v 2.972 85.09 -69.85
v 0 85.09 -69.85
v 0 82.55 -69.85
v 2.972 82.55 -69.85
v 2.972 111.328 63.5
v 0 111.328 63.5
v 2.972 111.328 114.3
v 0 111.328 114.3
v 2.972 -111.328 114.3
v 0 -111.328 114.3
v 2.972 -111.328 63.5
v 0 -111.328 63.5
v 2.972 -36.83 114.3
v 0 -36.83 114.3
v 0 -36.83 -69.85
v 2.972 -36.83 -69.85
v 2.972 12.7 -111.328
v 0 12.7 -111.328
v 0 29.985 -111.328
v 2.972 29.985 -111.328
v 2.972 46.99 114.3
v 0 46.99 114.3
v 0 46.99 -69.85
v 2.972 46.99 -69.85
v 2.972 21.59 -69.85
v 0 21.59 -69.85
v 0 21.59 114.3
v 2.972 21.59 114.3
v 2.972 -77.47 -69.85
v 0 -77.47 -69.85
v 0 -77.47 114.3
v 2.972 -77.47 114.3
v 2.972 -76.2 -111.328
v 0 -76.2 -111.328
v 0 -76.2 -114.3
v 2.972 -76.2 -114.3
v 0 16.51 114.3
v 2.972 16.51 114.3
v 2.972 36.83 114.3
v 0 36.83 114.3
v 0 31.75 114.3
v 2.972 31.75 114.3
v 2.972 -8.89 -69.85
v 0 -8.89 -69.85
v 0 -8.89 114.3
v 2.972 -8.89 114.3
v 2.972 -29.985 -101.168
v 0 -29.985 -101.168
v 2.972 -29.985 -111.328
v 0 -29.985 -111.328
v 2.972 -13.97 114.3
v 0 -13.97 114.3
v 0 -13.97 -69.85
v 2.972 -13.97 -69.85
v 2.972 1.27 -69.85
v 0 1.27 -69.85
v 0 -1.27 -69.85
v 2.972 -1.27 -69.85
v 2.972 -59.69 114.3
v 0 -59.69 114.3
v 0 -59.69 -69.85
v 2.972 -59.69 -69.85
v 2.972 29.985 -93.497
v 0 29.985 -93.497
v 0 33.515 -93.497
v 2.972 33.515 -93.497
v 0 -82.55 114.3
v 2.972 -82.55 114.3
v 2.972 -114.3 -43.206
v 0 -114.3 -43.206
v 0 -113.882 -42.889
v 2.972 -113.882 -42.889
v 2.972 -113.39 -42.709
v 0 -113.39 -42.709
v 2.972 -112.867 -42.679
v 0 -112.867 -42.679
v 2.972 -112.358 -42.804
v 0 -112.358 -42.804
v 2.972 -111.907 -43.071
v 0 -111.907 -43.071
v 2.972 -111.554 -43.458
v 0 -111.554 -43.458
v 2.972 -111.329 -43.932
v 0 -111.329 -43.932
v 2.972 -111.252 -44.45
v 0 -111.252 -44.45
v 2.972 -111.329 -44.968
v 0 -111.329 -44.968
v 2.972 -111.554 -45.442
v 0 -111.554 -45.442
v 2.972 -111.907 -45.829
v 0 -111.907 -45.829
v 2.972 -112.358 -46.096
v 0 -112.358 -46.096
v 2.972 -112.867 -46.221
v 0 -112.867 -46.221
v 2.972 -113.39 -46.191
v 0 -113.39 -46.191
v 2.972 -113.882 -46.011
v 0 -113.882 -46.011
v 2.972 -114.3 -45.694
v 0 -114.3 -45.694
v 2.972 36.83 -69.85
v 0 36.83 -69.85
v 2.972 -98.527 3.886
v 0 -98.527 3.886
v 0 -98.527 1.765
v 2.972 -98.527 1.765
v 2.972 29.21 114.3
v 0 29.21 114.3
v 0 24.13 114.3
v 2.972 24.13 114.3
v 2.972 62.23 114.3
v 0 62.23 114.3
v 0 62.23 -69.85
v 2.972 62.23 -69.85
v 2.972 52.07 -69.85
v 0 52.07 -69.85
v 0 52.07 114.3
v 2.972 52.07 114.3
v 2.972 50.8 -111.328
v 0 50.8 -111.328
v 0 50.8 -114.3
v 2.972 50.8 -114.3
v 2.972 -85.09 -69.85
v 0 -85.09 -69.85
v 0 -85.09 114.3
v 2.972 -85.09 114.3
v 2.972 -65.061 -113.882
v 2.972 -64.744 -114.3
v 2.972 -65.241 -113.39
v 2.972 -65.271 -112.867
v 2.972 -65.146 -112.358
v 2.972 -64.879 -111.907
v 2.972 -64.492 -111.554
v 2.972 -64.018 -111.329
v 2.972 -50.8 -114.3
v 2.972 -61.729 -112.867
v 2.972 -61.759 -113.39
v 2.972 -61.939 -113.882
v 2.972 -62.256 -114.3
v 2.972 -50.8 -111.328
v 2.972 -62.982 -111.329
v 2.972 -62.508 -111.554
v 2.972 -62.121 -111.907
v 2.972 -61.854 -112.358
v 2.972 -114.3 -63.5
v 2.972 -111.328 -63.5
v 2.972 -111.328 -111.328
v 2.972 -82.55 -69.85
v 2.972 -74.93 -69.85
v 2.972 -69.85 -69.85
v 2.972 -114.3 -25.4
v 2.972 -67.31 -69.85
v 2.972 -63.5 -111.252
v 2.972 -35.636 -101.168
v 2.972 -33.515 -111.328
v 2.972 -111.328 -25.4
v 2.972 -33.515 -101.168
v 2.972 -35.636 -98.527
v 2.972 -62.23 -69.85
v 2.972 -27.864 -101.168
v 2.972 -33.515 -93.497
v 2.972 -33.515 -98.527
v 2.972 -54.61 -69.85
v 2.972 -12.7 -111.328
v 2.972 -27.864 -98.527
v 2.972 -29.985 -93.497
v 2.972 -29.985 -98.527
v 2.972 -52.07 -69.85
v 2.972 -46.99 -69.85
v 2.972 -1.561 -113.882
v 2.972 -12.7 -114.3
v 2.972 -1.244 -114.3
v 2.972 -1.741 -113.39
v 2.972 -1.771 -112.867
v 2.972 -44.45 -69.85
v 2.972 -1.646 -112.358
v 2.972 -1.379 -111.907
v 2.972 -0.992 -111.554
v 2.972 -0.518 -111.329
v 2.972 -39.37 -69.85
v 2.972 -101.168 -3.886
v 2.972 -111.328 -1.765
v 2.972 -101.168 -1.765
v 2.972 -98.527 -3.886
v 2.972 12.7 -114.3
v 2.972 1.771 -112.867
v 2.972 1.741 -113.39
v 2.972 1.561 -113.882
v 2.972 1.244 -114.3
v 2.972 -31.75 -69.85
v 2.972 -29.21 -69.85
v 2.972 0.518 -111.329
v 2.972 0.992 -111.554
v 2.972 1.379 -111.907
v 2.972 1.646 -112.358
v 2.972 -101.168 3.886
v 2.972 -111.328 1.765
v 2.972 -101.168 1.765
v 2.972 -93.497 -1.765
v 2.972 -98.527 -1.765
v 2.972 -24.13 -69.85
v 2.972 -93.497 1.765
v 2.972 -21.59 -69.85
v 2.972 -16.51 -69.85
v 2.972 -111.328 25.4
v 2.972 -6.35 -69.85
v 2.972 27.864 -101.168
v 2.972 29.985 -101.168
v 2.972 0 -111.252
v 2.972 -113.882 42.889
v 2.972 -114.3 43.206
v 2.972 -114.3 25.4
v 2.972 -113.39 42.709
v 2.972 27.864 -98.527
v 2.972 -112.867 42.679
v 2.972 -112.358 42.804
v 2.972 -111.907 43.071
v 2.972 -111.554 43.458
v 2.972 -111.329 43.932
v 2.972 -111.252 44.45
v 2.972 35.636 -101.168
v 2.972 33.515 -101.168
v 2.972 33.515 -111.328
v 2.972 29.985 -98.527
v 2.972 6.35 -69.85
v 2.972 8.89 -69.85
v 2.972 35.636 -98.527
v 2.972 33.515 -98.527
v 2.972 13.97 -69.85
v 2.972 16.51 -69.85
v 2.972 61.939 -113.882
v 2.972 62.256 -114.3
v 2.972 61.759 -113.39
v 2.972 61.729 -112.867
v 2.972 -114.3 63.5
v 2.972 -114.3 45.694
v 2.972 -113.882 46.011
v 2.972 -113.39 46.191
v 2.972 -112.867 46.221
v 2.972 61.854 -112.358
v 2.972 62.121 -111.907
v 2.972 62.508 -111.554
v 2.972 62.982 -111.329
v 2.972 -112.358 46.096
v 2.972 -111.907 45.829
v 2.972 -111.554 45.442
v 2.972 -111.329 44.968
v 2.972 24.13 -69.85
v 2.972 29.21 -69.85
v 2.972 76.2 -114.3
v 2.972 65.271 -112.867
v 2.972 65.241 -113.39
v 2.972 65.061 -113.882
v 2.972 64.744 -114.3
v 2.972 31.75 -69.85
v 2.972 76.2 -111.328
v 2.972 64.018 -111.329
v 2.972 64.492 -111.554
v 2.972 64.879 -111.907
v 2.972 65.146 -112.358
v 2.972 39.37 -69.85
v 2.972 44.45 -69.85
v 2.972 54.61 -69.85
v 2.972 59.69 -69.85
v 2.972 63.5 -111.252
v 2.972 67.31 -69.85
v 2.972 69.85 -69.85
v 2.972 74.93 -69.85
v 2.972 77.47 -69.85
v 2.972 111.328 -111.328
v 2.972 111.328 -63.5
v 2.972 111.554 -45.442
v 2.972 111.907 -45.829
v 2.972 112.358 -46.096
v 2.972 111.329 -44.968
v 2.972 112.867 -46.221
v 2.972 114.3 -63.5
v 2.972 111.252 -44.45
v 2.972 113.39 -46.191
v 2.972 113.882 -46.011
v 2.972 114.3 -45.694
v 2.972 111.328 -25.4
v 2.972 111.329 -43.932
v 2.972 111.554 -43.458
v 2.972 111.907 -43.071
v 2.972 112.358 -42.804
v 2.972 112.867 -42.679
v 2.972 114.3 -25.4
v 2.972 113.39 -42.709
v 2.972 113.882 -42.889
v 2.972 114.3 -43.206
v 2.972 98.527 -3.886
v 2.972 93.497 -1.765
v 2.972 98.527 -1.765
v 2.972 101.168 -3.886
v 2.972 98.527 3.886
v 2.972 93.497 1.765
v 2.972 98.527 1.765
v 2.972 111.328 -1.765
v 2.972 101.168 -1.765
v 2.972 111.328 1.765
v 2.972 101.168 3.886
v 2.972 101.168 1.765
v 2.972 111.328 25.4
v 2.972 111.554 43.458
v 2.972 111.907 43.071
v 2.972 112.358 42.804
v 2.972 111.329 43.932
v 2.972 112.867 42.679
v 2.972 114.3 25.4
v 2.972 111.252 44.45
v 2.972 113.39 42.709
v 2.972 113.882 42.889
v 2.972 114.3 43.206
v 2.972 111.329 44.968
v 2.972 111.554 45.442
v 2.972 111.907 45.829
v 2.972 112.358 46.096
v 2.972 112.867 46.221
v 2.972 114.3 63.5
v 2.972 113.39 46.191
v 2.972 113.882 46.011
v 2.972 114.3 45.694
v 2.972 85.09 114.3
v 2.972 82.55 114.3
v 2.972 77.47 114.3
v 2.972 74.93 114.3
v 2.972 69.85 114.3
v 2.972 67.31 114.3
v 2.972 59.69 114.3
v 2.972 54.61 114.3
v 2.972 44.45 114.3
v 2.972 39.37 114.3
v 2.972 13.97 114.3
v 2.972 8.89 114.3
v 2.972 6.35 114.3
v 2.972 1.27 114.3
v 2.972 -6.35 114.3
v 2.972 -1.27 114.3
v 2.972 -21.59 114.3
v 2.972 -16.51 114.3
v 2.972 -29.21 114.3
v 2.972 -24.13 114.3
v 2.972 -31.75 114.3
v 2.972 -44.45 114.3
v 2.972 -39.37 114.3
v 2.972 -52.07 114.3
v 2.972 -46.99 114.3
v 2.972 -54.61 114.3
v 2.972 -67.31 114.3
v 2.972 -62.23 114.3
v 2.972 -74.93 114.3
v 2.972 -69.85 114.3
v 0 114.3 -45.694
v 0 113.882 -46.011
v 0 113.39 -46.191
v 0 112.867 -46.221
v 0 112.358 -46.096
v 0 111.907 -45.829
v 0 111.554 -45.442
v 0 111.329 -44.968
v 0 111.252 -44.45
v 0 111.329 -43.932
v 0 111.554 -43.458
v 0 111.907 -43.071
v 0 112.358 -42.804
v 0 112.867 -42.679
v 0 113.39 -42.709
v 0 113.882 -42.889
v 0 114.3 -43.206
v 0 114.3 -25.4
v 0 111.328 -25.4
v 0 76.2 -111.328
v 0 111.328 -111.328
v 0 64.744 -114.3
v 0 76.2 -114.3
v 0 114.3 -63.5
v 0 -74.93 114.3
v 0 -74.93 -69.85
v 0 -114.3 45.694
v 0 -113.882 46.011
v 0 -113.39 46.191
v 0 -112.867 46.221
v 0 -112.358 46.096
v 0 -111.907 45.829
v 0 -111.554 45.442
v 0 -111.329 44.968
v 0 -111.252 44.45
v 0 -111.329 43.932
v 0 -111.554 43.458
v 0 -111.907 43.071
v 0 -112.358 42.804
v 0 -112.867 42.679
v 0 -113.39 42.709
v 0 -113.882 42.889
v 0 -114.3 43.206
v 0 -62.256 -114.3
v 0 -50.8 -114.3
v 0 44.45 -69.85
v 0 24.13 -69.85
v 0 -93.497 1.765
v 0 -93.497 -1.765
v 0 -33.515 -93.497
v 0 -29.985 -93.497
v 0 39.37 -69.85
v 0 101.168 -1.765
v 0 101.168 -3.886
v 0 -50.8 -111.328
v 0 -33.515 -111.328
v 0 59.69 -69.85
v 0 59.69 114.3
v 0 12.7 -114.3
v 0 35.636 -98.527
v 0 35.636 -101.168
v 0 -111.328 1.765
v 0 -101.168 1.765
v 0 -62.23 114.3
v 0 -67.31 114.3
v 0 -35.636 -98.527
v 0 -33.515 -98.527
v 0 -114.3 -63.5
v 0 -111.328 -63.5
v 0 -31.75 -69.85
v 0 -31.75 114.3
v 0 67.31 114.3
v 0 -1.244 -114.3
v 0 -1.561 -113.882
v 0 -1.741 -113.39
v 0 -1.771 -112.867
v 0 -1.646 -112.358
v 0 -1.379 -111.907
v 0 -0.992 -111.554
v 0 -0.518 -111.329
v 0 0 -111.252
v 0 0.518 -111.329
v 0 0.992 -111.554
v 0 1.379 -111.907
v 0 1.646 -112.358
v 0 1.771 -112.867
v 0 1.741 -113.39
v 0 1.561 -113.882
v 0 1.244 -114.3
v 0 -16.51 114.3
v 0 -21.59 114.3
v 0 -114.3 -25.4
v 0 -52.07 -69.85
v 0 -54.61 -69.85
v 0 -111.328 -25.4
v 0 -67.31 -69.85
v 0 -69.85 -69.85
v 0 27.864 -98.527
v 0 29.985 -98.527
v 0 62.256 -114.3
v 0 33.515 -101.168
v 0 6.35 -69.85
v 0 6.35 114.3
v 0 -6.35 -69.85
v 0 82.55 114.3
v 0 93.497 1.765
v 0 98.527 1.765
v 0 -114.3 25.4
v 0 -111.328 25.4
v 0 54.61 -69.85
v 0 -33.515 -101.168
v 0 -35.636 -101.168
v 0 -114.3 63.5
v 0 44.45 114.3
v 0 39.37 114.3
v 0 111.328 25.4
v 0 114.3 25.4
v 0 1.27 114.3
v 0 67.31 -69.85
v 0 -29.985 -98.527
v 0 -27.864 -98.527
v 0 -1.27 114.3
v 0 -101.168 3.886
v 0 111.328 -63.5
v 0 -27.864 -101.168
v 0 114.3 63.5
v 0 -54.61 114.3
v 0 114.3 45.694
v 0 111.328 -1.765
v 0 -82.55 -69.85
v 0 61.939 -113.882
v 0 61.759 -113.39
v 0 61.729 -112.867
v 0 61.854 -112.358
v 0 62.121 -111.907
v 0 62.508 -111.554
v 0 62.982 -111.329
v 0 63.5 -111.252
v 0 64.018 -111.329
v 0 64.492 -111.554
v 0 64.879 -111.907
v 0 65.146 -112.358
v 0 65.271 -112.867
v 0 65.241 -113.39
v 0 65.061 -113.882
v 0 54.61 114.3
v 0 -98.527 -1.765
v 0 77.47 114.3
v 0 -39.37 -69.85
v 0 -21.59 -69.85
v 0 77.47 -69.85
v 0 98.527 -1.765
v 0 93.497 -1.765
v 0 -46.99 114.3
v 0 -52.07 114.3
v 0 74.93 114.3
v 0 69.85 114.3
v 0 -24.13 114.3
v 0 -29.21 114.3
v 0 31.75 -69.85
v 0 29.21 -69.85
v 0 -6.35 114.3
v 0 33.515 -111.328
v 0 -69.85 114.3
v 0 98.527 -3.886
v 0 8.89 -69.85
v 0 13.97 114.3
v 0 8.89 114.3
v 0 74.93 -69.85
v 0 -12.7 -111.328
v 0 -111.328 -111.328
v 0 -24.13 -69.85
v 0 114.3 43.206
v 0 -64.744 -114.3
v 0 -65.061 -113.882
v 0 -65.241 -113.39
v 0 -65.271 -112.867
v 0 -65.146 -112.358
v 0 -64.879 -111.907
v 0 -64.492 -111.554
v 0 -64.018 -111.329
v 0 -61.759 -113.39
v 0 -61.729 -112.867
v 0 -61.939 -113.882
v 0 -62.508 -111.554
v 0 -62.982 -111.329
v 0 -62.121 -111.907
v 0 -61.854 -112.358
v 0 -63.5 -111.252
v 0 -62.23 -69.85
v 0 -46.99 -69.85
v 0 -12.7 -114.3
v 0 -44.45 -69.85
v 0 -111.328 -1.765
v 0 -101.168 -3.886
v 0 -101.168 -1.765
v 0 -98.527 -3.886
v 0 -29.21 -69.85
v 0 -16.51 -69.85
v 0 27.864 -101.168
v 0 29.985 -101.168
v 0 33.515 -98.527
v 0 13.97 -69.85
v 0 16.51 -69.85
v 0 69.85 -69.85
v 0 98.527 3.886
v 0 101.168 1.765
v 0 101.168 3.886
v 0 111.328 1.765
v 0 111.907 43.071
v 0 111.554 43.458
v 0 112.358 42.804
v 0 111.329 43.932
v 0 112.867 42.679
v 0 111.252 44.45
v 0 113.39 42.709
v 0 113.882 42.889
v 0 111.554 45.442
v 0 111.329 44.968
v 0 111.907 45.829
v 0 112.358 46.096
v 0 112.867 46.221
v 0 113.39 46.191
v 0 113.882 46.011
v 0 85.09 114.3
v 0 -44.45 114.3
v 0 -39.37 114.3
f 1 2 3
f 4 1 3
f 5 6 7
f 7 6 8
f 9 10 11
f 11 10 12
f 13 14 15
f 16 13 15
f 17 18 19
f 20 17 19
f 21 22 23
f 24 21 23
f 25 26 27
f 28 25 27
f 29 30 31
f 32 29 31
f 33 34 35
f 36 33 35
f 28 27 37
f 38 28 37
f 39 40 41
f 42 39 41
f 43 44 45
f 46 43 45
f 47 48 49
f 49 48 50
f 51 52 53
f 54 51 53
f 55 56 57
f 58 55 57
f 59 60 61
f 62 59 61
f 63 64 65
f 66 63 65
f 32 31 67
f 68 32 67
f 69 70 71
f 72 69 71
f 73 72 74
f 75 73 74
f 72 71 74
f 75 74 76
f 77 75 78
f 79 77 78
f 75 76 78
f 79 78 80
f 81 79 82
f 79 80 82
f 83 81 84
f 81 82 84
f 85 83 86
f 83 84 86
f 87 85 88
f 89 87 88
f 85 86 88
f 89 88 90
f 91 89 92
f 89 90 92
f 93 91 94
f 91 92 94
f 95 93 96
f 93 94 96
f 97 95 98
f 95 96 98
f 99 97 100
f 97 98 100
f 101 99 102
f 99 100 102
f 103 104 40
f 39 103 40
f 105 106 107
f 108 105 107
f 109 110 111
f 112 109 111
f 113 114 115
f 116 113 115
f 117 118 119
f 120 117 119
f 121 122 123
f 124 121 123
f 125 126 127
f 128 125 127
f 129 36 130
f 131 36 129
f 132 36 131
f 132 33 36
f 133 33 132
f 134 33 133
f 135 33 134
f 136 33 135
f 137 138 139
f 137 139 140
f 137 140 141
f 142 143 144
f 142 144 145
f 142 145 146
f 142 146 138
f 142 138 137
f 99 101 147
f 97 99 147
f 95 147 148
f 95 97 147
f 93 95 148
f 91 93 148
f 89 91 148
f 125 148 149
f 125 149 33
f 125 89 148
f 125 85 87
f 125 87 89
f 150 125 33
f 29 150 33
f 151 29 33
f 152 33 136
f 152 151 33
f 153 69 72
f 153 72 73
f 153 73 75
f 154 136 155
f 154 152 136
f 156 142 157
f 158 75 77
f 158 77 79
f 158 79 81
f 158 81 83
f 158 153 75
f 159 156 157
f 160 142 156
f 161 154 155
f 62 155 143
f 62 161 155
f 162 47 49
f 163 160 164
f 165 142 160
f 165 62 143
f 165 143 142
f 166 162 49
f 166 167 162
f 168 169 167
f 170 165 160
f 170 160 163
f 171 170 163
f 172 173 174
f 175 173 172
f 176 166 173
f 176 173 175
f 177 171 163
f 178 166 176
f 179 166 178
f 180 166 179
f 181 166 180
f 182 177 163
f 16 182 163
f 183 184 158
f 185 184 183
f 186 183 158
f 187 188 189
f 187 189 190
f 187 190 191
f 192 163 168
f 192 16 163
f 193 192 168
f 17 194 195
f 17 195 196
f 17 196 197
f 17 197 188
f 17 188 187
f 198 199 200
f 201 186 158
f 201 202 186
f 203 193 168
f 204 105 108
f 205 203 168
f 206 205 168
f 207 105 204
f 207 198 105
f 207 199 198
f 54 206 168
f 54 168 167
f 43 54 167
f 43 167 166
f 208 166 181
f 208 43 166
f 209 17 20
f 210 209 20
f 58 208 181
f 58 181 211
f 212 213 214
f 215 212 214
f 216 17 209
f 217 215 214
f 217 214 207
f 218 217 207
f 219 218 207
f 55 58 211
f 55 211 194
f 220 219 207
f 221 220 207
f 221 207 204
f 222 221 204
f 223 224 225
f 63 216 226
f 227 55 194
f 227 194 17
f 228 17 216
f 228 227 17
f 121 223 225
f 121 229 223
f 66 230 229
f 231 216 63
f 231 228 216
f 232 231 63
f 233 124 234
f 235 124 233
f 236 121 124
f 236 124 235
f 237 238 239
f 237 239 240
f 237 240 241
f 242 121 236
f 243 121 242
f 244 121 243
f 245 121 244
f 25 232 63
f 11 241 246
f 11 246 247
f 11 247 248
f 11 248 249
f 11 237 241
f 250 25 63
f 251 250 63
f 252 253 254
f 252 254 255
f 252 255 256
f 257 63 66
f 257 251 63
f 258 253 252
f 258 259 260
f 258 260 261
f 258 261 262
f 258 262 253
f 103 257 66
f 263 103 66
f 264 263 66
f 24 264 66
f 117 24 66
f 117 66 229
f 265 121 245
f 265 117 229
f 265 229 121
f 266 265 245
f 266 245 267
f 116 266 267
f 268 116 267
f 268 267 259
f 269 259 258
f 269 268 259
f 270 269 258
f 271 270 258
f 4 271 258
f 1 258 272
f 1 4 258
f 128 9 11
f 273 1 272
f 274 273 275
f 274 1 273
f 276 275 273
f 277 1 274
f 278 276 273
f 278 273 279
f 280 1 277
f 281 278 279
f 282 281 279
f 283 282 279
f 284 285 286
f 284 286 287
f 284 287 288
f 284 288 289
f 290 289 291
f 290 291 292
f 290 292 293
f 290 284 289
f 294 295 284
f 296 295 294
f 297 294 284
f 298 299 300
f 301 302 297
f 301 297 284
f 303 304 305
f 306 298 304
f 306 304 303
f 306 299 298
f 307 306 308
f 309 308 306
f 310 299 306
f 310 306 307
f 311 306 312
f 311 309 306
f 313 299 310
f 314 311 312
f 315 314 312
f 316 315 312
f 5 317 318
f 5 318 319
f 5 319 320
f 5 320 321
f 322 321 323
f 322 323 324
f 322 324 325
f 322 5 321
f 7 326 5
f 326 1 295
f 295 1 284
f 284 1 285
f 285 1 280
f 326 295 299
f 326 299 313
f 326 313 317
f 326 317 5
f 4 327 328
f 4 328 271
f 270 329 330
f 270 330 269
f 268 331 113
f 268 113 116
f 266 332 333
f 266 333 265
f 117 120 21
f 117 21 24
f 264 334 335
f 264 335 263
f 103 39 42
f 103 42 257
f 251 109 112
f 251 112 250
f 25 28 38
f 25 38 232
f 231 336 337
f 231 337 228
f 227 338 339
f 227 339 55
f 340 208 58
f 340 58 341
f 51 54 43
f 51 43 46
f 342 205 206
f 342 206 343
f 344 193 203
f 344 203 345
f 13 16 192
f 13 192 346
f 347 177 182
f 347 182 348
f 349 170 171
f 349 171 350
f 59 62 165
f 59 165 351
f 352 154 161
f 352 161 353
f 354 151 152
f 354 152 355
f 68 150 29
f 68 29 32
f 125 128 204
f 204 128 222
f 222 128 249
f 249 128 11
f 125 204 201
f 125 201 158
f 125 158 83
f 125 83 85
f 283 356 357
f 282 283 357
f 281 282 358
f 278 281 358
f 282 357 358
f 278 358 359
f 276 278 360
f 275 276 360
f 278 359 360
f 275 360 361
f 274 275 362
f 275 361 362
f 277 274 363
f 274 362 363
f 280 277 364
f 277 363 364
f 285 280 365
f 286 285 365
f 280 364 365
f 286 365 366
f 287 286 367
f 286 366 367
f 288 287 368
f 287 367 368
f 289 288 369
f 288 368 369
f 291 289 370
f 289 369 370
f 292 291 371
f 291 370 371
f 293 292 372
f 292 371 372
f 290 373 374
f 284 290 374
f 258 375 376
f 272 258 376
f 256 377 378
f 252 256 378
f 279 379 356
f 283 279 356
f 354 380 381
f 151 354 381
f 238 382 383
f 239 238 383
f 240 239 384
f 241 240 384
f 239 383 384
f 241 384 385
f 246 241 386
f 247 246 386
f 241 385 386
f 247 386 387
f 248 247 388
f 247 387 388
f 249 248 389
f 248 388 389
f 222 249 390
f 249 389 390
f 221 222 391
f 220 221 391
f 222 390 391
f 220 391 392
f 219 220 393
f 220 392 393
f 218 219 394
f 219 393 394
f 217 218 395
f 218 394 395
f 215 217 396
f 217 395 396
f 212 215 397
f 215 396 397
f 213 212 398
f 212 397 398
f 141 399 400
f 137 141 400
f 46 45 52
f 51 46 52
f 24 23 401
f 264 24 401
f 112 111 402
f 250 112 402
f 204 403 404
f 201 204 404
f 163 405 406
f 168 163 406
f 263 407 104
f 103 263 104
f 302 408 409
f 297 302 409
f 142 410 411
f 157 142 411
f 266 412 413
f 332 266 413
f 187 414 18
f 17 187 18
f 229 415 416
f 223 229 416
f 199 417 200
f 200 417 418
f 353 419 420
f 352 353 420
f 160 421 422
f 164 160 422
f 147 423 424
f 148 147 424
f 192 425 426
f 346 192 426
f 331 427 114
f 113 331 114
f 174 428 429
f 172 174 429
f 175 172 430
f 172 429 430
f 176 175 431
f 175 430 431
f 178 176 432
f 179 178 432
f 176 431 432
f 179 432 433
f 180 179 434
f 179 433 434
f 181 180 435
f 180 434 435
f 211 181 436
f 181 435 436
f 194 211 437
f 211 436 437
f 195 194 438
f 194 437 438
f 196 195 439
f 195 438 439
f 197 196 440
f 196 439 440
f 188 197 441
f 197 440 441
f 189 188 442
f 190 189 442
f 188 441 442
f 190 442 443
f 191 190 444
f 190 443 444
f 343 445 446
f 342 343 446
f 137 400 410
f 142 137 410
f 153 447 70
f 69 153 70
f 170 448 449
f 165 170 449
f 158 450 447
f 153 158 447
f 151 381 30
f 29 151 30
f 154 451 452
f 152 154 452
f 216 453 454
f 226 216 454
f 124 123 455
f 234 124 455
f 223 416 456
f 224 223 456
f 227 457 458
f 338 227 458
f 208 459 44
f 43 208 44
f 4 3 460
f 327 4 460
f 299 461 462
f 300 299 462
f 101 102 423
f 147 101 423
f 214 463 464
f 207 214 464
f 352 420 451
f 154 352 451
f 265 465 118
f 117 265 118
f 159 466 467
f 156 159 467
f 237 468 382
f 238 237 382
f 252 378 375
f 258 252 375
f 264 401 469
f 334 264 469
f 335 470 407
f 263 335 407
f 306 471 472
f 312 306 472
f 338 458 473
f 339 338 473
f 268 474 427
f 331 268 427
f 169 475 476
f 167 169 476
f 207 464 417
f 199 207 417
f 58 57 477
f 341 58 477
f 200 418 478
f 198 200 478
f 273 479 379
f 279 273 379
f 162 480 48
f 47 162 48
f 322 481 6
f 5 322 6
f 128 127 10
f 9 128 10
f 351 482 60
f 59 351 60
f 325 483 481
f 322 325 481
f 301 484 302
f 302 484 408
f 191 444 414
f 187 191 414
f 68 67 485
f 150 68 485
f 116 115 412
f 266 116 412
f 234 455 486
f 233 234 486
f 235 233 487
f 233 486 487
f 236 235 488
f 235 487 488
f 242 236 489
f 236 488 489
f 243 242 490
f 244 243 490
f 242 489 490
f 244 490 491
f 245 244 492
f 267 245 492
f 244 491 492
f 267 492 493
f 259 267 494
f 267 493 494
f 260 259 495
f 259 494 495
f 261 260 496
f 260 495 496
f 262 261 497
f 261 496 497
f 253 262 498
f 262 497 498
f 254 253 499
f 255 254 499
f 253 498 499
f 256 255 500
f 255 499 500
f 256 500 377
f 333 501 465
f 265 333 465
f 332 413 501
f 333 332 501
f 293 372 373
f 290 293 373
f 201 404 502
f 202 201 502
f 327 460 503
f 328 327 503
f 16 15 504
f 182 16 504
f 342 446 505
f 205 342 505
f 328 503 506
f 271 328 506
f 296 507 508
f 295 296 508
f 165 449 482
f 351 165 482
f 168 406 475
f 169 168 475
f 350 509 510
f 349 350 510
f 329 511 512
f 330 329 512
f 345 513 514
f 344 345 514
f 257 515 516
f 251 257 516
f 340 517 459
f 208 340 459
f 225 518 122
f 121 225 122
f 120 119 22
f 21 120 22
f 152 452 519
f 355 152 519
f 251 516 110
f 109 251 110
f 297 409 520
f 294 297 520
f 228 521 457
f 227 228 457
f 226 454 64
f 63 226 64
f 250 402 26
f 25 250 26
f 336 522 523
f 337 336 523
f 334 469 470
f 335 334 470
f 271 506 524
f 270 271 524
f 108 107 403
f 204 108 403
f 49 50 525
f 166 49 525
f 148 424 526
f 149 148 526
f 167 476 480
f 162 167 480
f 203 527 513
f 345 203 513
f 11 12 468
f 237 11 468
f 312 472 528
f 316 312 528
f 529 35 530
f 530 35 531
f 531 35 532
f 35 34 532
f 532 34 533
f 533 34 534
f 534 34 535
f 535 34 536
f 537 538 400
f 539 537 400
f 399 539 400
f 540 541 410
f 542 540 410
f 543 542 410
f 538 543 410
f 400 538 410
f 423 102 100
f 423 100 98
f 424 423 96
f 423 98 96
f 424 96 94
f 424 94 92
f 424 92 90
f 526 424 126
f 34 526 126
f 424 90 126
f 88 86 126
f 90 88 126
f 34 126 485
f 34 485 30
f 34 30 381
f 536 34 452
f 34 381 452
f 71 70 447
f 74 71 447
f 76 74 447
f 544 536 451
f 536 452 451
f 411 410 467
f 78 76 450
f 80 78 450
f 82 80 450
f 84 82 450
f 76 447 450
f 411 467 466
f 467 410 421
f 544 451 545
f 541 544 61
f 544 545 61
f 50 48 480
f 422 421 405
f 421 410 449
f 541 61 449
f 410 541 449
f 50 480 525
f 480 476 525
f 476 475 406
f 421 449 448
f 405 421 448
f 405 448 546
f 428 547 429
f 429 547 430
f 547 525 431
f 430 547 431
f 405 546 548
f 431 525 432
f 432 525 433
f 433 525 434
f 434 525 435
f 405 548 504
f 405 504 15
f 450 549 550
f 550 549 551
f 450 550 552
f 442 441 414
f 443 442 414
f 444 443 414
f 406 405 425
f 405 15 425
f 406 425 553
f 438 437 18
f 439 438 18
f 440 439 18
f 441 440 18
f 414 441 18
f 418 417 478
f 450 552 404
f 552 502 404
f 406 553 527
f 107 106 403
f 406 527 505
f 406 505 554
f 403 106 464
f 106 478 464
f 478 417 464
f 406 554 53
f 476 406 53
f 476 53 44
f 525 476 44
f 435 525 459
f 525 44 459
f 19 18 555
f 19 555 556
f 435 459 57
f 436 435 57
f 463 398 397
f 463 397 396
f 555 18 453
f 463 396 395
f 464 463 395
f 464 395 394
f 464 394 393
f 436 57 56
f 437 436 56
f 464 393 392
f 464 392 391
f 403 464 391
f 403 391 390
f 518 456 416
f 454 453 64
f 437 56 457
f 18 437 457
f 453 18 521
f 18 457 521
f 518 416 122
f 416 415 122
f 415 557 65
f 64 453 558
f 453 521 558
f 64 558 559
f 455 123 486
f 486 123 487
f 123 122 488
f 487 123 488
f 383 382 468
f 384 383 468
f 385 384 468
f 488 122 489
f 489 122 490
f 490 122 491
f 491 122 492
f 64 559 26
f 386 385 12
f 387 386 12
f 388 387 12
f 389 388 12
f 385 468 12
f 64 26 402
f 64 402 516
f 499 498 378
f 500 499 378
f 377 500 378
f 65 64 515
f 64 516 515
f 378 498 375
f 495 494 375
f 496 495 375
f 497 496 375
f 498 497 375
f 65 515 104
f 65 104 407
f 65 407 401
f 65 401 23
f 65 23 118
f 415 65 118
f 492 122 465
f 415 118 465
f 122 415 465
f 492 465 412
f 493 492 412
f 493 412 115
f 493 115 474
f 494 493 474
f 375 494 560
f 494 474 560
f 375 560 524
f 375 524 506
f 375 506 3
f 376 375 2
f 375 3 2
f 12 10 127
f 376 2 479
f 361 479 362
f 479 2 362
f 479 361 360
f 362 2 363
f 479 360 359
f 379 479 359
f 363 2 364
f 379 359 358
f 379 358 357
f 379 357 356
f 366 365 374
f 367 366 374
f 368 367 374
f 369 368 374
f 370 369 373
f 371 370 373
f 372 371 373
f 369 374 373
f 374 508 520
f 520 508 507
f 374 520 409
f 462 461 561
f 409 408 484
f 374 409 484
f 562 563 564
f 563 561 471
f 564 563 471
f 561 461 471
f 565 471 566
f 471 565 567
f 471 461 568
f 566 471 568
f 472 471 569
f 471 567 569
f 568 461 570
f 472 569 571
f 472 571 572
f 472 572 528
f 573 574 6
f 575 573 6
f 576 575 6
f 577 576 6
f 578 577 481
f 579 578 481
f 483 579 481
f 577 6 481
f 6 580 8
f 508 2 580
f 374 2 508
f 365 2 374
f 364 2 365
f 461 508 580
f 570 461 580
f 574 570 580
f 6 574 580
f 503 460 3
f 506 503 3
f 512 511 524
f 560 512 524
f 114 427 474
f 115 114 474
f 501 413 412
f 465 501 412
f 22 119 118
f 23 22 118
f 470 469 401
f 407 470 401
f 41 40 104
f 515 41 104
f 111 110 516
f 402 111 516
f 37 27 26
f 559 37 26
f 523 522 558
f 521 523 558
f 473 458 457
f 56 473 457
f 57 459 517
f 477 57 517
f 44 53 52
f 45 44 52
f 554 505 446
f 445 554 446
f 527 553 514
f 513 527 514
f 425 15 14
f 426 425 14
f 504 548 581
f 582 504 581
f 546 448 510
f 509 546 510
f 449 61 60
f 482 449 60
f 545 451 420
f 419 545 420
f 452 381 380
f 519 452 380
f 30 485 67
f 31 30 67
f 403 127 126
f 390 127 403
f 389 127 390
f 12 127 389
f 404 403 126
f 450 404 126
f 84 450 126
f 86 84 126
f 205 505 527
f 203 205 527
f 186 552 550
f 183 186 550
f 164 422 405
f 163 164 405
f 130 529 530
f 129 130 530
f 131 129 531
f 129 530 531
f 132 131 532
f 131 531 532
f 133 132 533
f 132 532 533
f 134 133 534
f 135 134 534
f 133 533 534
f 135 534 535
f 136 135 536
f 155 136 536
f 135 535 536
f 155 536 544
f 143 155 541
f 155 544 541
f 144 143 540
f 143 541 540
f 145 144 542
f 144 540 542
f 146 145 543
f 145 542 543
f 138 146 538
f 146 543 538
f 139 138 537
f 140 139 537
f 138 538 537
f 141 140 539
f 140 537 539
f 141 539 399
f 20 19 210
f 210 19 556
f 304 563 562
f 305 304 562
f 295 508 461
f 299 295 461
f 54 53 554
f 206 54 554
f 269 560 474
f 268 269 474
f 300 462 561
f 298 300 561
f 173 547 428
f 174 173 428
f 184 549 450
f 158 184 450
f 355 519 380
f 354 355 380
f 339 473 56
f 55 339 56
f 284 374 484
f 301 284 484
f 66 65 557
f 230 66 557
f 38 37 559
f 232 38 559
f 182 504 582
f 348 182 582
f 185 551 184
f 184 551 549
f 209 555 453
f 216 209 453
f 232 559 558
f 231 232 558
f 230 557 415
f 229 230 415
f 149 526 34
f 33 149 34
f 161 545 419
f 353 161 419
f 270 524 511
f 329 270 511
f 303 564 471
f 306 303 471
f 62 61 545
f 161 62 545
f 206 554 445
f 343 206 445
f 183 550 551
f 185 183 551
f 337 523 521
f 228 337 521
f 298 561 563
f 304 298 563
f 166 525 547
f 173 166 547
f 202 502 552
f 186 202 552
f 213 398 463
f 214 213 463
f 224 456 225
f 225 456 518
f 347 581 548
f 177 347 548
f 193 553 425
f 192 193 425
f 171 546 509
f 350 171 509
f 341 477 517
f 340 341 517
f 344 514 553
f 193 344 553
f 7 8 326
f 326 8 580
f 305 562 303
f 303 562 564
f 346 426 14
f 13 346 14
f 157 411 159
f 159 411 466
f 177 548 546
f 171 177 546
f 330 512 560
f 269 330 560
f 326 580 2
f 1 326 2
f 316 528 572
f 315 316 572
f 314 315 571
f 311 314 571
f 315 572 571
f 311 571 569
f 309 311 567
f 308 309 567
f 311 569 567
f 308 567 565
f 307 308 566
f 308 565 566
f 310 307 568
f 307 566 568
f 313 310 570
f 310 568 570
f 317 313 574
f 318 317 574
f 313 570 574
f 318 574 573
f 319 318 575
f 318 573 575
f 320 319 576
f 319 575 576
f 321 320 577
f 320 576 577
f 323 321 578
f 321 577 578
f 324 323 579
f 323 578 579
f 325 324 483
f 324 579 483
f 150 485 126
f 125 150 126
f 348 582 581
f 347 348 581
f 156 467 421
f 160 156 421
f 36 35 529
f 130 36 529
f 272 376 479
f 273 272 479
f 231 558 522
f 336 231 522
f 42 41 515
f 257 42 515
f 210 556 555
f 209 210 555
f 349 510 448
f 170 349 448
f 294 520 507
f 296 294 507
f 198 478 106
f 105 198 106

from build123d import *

# Parameters (mm, degrees)
F1_DEPTH = 2.9718


with BuildPart() as f1:
    # F0 (on Right) → F1 (new body)
    with BuildSketch(Plane.YZ):
        with BuildLine():
            Line((76.2, -111.3282), (111.3282, -111.3282))
            Line((111.3282, -111.3282), (111.3282, -63.5))
            Line((111.3282, -63.5), (114.3, -63.5))
            Line((114.3, -63.5), (114.3, -45.6943407893))
            ThreePointArc((114.3, -45.6943407893), (111.252, -44.45), (114.3, -43.2056592107))
            Line((114.3, -43.2056592107), (114.3, -25.4))
            Line((114.3, -25.4), (111.3282, -25.4))
            Line((111.3282, -25.4), (111.3282, -1.7653))
            Line((111.3282, -1.7653), (101.1682, -1.7653))
            Line((101.1682, -1.7653), (101.1682, -3.8862))
            Line((101.1682, -3.8862), (98.5266, -3.8862))
            Line((98.5266, -3.8862), (98.5266, -1.7653))
            Line((98.5266, -1.7653), (93.4974, -1.7653))
            Line((93.4974, -1.7653), (93.4974, 1.7653))
            Line((93.4974, 1.7653), (98.5266, 1.7653))
            Line((98.5266, 1.7653), (98.5266, 3.8862))
            Line((98.5266, 3.8862), (101.1682, 3.8862))
            Line((101.1682, 3.8862), (101.1682, 1.7653))
            Line((101.1682, 1.7653), (111.3282, 1.7653))
            Line((111.3282, 1.7653), (111.3282, 25.4))
            Line((111.3282, 25.4), (114.3, 25.4))
            Line((114.3, 25.4), (114.3, 43.2056592107))
            ThreePointArc((114.3, 43.2056592107), (111.252, 44.45), (114.3, 45.6943407893))
            Line((114.3, 45.6943407893), (114.3, 63.5))
            Line((114.3, 63.5), (111.3282, 63.5))
            Line((111.3282, 63.5), (111.3282, 114.3))
            Line((111.3282, 114.3), (85.09, 114.3))
            Line((85.09, 114.3), (85.09, -69.85))
            Line((85.09, -69.85), (82.55, -69.85))
            Line((82.55, -69.85), (82.55, 114.3))
            Line((82.55, 114.3), (77.47, 114.3))
            Line((77.47, 114.3), (77.47, -69.85))
            Line((77.47, -69.85), (74.93, -69.85))
            Line((74.93, -69.85), (74.93, 114.3))
            Line((74.93, 114.3), (69.85, 114.3))
            Line((69.85, 114.3), (69.85, -69.85))
            Line((69.85, -69.85), (67.31, -69.85))
            Line((67.31, -69.85), (67.31, 114.3))
            Line((67.31, 114.3), (62.23, 114.3))
            Line((62.23, 114.3), (62.23, -69.85))
            Line((62.23, -69.85), (59.69, -69.85))
            Line((59.69, -69.85), (59.69, 114.3))
            Line((59.69, 114.3), (54.61, 114.3))
            Line((54.61, 114.3), (54.61, -69.85))
            Line((54.61, -69.85), (52.07, -69.85))
            Line((52.07, -69.85), (52.07, 114.3))
            Line((52.07, 114.3), (46.99, 114.3))
            Line((46.99, 114.3), (46.99, -69.85))
            Line((46.99, -69.85), (44.45, -69.85))
            Line((44.45, -69.85), (44.45, 114.3))
            Line((44.45, 114.3), (39.37, 114.3))
            Line((39.37, 114.3), (39.37, -69.85))
            Line((39.37, -69.85), (36.83, -69.85))
            Line((36.83, -69.85), (36.83, 114.3))
            Line((36.83, 114.3), (31.75, 114.3))
            Line((31.75, 114.3), (31.75, -69.85))
            Line((31.75, -69.85), (29.21, -69.85))
            Line((29.21, -69.85), (29.21, 114.3))
            Line((29.21, 114.3), (24.13, 114.3))
            Line((24.13, 114.3), (24.13, -69.85))
            Line((24.13, -69.85), (21.59, -69.85))
            Line((21.59, -69.85), (21.59, 114.3))
            Line((21.59, 114.3), (16.51, 114.3))
            Line((16.51, 114.3), (16.51, -69.85))
            Line((16.51, -69.85), (13.97, -69.85))
            Line((13.97, -69.85), (13.97, 114.3))
            Line((13.97, 114.3), (8.89, 114.3))
            Line((8.89, 114.3), (8.89, -69.85))
            Line((8.89, -69.85), (6.35, -69.85))
            Line((6.35, -69.85), (6.35, 114.3))
            Line((6.35, 114.3), (1.27, 114.3))
            Line((1.27, 114.3), (1.27, -69.85))
            Line((1.27, -69.85), (-1.27, -69.85))
            Line((-1.27, -69.85), (-1.27, 114.3))
            Line((-1.27, 114.3), (-6.35, 114.3))
            Line((-6.35, 114.3), (-6.35, -69.85))
            Line((-6.35, -69.85), (-8.89, -69.85))
            Line((-8.89, -69.85), (-8.89, 114.3))
            Line((-8.89, 114.3), (-13.97, 114.3))
            Line((-13.97, 114.3), (-13.97, -69.85))
            Line((-13.97, -69.85), (-16.51, -69.85))
            Line((-16.51, -69.85), (-16.51, 114.3))
            Line((-16.51, 114.3), (-21.59, 114.3))
            Line((-21.59, 114.3), (-21.59, -69.85))
            Line((-21.59, -69.85), (-24.13, -69.85))
            Line((-24.13, -69.85), (-24.13, 114.3))
            Line((-24.13, 114.3), (-29.21, 114.3))
            Line((-29.21, 114.3), (-29.21, -69.85))
            Line((-29.21, -69.85), (-31.75, -69.85))
            Line((-31.75, -69.85), (-31.75, 114.3))
            Line((-31.75, 114.3), (-36.83, 114.3))
            Line((-36.83, 114.3), (-36.83, -69.85))
            Line((-36.83, -69.85), (-39.37, -69.85))
            Line((-39.37, -69.85), (-39.37, 114.3))
            Line((-39.37, 114.3), (-44.45, 114.3))
            Line((-44.45, 114.3), (-44.45, -69.85))
            Line((-44.45, -69.85), (-46.99, -69.85))
            Line((-46.99, -69.85), (-46.99, 114.3))
            Line((-46.99, 114.3), (-52.07, 114.3))
            Line((-52.07, 114.3), (-52.07, -69.85))
            Line((-52.07, -69.85), (-54.61, -69.85))
            Line((-54.61, -69.85), (-54.61, 114.3))
            Line((-54.61, 114.3), (-59.69, 114.3))
            Line((-59.69, 114.3), (-59.69, -69.85))
            Line((-59.69, -69.85), (-62.23, -69.85))
            Line((-62.23, -69.85), (-62.23, 114.3))
            Line((-62.23, 114.3), (-67.31, 114.3))
            Line((-67.31, 114.3), (-67.31, -69.85))
            Line((-67.31, -69.85), (-69.85, -69.85))
            Line((-69.85, -69.85), (-69.85, 114.3))
            Line((-69.85, 114.3), (-74.93, 114.3))
            Line((-74.93, 114.3), (-74.93, -69.85))
            Line((-74.93, -69.85), (-77.47, -69.85))
            Line((-77.47, -69.85), (-77.47, 114.3))
            Line((-77.47, 114.3), (-82.55, 114.3))
            Line((-82.55, 114.3), (-82.55, -69.85))
            Line((-82.55, -69.85), (-85.09, -69.85))
            Line((-85.09, -69.85), (-85.09, 114.3))
            Line((-85.09, 114.3), (-111.3282, 114.3))
            Line((-111.3282, 114.3), (-111.3282, 63.5))
            Line((-111.3282, 63.5), (-114.3, 63.5))
            Line((-114.3, 63.5), (-114.3, 45.6943407893))
            ThreePointArc((-114.3, 45.6943407893), (-111.252, 44.45), (-114.3, 43.2056592107))
            Line((-114.3, 43.2056592107), (-114.3, 25.4))
            Line((-114.3, 25.4), (-111.3282, 25.4))
            Line((-111.3282, 25.4), (-111.3282, 1.7653))
            Line((-111.3282, 1.7653), (-101.1682, 1.7653))
            Line((-101.1682, 1.7653), (-101.1682, 3.8862))
            Line((-101.1682, 3.8862), (-98.5266, 3.8862))
            Line((-98.5266, 3.8862), (-98.5266, 1.7653))
            Line((-98.5266, 1.7653), (-93.4974, 1.7653))
            Line((-93.4974, 1.7653), (-93.4974, -1.7653))
            Line((-93.4974, -1.7653), (-98.5266, -1.7653))
            Line((-98.5266, -1.7653), (-98.5266, -3.8862))
            Line((-98.5266, -3.8862), (-101.1682, -3.8862))
            Line((-101.1682, -3.8862), (-101.1682, -1.7653))
            Line((-101.1682, -1.7653), (-111.3282, -1.7653))
            Line((-111.3282, -1.7653), (-111.3282, -25.4))
            Line((-111.3282, -25.4), (-114.3, -25.4))
            Line((-114.3, -25.4), (-114.3, -43.2056592107))
            ThreePointArc((-114.3, -43.2056592107), (-111.252, -44.45), (-114.3, -45.6943407893))
            Line((-114.3, -45.6943407893), (-114.3, -63.5))
            Line((-114.3, -63.5), (-111.3282, -63.5))
            Line((-111.3282, -63.5), (-111.3282, -111.3282))
            Line((-111.3282, -111.3282), (-76.2, -111.3282))
            Line((-76.2, -111.3282), (-76.2, -114.3))
            Line((-76.2, -114.3), (-64.7443407893, -114.3))
            ThreePointArc((-64.7443407893, -114.3), (-63.5, -111.252), (-62.2556592107, -114.3))
            Line((-62.2556592107, -114.3), (-50.8, -114.3))
            Line((-50.8, -114.3), (-50.8, -111.3282))
            Line((-50.8, -111.3282), (-33.5153, -111.3282))
            Line((-33.5153, -111.3282), (-33.5153, -101.1682))
            Line((-33.5153, -101.1682), (-35.6362, -101.1682))
            Line((-35.6362, -101.1682), (-35.6362, -98.5266))
            Line((-35.6362, -98.5266), (-33.5153, -98.5266))
            Line((-33.5153, -98.5266), (-33.5153, -93.4974))
            Line((-33.5153, -93.4974), (-29.9847, -93.4974))
            Line((-29.9847, -93.4974), (-29.9847, -98.5266))
            Line((-29.9847, -98.5266), (-27.8638, -98.5266))
            Line((-27.8638, -98.5266), (-27.8638, -101.1682))
            Line((-27.8638, -101.1682), (-29.9847, -101.1682))
            Line((-29.9847, -101.1682), (-29.9847, -111.3282))
            Line((-29.9847, -111.3282), (-12.7, -111.3282))
            Line((-12.7, -111.3282), (-12.7, -114.3))
            Line((-12.7, -114.3), (-1.2443407893, -114.3))
            ThreePointArc((-1.2443407893, -114.3), (0, -111.252), (1.2443407893, -114.3))
            Line((1.2443407893, -114.3), (12.7, -114.3))
            Line((12.7, -114.3), (12.7, -111.3282))
            Line((12.7, -111.3282), (29.9847, -111.3282))
            Line((29.9847, -111.3282), (29.9847, -101.1682))
            Line((29.9847, -101.1682), (27.8638, -101.1682))
            Line((27.8638, -101.1682), (27.8638, -98.5266))
            Line((27.8638, -98.5266), (29.9847, -98.5266))
            Line((29.9847, -98.5266), (29.9847, -93.4974))
            Line((29.9847, -93.4974), (33.5153, -93.4974))
            Line((33.5153, -93.4974), (33.5153, -98.5266))
            Line((33.5153, -98.5266), (35.6362, -98.5266))
            Line((35.6362, -98.5266), (35.6362, -101.1682))
            Line((35.6362, -101.1682), (33.5153, -101.1682))
            Line((33.5153, -101.1682), (33.5153, -111.3282))
            Line((33.5153, -111.3282), (50.8, -111.3282))
            Line((50.8, -111.3282), (50.8, -114.3))
            Line((50.8, -114.3), (62.2556592107, -114.3))
            ThreePointArc((62.2556592107, -114.3), (63.5, -111.252), (64.7443407893, -114.3))
            Line((64.7443407893, -114.3), (76.2, -114.3))
            Line((76.2, -114.3), (76.2, -111.3282))
        make_face()
    extrude(amount=F1_DEPTH)


solid = f1.part
